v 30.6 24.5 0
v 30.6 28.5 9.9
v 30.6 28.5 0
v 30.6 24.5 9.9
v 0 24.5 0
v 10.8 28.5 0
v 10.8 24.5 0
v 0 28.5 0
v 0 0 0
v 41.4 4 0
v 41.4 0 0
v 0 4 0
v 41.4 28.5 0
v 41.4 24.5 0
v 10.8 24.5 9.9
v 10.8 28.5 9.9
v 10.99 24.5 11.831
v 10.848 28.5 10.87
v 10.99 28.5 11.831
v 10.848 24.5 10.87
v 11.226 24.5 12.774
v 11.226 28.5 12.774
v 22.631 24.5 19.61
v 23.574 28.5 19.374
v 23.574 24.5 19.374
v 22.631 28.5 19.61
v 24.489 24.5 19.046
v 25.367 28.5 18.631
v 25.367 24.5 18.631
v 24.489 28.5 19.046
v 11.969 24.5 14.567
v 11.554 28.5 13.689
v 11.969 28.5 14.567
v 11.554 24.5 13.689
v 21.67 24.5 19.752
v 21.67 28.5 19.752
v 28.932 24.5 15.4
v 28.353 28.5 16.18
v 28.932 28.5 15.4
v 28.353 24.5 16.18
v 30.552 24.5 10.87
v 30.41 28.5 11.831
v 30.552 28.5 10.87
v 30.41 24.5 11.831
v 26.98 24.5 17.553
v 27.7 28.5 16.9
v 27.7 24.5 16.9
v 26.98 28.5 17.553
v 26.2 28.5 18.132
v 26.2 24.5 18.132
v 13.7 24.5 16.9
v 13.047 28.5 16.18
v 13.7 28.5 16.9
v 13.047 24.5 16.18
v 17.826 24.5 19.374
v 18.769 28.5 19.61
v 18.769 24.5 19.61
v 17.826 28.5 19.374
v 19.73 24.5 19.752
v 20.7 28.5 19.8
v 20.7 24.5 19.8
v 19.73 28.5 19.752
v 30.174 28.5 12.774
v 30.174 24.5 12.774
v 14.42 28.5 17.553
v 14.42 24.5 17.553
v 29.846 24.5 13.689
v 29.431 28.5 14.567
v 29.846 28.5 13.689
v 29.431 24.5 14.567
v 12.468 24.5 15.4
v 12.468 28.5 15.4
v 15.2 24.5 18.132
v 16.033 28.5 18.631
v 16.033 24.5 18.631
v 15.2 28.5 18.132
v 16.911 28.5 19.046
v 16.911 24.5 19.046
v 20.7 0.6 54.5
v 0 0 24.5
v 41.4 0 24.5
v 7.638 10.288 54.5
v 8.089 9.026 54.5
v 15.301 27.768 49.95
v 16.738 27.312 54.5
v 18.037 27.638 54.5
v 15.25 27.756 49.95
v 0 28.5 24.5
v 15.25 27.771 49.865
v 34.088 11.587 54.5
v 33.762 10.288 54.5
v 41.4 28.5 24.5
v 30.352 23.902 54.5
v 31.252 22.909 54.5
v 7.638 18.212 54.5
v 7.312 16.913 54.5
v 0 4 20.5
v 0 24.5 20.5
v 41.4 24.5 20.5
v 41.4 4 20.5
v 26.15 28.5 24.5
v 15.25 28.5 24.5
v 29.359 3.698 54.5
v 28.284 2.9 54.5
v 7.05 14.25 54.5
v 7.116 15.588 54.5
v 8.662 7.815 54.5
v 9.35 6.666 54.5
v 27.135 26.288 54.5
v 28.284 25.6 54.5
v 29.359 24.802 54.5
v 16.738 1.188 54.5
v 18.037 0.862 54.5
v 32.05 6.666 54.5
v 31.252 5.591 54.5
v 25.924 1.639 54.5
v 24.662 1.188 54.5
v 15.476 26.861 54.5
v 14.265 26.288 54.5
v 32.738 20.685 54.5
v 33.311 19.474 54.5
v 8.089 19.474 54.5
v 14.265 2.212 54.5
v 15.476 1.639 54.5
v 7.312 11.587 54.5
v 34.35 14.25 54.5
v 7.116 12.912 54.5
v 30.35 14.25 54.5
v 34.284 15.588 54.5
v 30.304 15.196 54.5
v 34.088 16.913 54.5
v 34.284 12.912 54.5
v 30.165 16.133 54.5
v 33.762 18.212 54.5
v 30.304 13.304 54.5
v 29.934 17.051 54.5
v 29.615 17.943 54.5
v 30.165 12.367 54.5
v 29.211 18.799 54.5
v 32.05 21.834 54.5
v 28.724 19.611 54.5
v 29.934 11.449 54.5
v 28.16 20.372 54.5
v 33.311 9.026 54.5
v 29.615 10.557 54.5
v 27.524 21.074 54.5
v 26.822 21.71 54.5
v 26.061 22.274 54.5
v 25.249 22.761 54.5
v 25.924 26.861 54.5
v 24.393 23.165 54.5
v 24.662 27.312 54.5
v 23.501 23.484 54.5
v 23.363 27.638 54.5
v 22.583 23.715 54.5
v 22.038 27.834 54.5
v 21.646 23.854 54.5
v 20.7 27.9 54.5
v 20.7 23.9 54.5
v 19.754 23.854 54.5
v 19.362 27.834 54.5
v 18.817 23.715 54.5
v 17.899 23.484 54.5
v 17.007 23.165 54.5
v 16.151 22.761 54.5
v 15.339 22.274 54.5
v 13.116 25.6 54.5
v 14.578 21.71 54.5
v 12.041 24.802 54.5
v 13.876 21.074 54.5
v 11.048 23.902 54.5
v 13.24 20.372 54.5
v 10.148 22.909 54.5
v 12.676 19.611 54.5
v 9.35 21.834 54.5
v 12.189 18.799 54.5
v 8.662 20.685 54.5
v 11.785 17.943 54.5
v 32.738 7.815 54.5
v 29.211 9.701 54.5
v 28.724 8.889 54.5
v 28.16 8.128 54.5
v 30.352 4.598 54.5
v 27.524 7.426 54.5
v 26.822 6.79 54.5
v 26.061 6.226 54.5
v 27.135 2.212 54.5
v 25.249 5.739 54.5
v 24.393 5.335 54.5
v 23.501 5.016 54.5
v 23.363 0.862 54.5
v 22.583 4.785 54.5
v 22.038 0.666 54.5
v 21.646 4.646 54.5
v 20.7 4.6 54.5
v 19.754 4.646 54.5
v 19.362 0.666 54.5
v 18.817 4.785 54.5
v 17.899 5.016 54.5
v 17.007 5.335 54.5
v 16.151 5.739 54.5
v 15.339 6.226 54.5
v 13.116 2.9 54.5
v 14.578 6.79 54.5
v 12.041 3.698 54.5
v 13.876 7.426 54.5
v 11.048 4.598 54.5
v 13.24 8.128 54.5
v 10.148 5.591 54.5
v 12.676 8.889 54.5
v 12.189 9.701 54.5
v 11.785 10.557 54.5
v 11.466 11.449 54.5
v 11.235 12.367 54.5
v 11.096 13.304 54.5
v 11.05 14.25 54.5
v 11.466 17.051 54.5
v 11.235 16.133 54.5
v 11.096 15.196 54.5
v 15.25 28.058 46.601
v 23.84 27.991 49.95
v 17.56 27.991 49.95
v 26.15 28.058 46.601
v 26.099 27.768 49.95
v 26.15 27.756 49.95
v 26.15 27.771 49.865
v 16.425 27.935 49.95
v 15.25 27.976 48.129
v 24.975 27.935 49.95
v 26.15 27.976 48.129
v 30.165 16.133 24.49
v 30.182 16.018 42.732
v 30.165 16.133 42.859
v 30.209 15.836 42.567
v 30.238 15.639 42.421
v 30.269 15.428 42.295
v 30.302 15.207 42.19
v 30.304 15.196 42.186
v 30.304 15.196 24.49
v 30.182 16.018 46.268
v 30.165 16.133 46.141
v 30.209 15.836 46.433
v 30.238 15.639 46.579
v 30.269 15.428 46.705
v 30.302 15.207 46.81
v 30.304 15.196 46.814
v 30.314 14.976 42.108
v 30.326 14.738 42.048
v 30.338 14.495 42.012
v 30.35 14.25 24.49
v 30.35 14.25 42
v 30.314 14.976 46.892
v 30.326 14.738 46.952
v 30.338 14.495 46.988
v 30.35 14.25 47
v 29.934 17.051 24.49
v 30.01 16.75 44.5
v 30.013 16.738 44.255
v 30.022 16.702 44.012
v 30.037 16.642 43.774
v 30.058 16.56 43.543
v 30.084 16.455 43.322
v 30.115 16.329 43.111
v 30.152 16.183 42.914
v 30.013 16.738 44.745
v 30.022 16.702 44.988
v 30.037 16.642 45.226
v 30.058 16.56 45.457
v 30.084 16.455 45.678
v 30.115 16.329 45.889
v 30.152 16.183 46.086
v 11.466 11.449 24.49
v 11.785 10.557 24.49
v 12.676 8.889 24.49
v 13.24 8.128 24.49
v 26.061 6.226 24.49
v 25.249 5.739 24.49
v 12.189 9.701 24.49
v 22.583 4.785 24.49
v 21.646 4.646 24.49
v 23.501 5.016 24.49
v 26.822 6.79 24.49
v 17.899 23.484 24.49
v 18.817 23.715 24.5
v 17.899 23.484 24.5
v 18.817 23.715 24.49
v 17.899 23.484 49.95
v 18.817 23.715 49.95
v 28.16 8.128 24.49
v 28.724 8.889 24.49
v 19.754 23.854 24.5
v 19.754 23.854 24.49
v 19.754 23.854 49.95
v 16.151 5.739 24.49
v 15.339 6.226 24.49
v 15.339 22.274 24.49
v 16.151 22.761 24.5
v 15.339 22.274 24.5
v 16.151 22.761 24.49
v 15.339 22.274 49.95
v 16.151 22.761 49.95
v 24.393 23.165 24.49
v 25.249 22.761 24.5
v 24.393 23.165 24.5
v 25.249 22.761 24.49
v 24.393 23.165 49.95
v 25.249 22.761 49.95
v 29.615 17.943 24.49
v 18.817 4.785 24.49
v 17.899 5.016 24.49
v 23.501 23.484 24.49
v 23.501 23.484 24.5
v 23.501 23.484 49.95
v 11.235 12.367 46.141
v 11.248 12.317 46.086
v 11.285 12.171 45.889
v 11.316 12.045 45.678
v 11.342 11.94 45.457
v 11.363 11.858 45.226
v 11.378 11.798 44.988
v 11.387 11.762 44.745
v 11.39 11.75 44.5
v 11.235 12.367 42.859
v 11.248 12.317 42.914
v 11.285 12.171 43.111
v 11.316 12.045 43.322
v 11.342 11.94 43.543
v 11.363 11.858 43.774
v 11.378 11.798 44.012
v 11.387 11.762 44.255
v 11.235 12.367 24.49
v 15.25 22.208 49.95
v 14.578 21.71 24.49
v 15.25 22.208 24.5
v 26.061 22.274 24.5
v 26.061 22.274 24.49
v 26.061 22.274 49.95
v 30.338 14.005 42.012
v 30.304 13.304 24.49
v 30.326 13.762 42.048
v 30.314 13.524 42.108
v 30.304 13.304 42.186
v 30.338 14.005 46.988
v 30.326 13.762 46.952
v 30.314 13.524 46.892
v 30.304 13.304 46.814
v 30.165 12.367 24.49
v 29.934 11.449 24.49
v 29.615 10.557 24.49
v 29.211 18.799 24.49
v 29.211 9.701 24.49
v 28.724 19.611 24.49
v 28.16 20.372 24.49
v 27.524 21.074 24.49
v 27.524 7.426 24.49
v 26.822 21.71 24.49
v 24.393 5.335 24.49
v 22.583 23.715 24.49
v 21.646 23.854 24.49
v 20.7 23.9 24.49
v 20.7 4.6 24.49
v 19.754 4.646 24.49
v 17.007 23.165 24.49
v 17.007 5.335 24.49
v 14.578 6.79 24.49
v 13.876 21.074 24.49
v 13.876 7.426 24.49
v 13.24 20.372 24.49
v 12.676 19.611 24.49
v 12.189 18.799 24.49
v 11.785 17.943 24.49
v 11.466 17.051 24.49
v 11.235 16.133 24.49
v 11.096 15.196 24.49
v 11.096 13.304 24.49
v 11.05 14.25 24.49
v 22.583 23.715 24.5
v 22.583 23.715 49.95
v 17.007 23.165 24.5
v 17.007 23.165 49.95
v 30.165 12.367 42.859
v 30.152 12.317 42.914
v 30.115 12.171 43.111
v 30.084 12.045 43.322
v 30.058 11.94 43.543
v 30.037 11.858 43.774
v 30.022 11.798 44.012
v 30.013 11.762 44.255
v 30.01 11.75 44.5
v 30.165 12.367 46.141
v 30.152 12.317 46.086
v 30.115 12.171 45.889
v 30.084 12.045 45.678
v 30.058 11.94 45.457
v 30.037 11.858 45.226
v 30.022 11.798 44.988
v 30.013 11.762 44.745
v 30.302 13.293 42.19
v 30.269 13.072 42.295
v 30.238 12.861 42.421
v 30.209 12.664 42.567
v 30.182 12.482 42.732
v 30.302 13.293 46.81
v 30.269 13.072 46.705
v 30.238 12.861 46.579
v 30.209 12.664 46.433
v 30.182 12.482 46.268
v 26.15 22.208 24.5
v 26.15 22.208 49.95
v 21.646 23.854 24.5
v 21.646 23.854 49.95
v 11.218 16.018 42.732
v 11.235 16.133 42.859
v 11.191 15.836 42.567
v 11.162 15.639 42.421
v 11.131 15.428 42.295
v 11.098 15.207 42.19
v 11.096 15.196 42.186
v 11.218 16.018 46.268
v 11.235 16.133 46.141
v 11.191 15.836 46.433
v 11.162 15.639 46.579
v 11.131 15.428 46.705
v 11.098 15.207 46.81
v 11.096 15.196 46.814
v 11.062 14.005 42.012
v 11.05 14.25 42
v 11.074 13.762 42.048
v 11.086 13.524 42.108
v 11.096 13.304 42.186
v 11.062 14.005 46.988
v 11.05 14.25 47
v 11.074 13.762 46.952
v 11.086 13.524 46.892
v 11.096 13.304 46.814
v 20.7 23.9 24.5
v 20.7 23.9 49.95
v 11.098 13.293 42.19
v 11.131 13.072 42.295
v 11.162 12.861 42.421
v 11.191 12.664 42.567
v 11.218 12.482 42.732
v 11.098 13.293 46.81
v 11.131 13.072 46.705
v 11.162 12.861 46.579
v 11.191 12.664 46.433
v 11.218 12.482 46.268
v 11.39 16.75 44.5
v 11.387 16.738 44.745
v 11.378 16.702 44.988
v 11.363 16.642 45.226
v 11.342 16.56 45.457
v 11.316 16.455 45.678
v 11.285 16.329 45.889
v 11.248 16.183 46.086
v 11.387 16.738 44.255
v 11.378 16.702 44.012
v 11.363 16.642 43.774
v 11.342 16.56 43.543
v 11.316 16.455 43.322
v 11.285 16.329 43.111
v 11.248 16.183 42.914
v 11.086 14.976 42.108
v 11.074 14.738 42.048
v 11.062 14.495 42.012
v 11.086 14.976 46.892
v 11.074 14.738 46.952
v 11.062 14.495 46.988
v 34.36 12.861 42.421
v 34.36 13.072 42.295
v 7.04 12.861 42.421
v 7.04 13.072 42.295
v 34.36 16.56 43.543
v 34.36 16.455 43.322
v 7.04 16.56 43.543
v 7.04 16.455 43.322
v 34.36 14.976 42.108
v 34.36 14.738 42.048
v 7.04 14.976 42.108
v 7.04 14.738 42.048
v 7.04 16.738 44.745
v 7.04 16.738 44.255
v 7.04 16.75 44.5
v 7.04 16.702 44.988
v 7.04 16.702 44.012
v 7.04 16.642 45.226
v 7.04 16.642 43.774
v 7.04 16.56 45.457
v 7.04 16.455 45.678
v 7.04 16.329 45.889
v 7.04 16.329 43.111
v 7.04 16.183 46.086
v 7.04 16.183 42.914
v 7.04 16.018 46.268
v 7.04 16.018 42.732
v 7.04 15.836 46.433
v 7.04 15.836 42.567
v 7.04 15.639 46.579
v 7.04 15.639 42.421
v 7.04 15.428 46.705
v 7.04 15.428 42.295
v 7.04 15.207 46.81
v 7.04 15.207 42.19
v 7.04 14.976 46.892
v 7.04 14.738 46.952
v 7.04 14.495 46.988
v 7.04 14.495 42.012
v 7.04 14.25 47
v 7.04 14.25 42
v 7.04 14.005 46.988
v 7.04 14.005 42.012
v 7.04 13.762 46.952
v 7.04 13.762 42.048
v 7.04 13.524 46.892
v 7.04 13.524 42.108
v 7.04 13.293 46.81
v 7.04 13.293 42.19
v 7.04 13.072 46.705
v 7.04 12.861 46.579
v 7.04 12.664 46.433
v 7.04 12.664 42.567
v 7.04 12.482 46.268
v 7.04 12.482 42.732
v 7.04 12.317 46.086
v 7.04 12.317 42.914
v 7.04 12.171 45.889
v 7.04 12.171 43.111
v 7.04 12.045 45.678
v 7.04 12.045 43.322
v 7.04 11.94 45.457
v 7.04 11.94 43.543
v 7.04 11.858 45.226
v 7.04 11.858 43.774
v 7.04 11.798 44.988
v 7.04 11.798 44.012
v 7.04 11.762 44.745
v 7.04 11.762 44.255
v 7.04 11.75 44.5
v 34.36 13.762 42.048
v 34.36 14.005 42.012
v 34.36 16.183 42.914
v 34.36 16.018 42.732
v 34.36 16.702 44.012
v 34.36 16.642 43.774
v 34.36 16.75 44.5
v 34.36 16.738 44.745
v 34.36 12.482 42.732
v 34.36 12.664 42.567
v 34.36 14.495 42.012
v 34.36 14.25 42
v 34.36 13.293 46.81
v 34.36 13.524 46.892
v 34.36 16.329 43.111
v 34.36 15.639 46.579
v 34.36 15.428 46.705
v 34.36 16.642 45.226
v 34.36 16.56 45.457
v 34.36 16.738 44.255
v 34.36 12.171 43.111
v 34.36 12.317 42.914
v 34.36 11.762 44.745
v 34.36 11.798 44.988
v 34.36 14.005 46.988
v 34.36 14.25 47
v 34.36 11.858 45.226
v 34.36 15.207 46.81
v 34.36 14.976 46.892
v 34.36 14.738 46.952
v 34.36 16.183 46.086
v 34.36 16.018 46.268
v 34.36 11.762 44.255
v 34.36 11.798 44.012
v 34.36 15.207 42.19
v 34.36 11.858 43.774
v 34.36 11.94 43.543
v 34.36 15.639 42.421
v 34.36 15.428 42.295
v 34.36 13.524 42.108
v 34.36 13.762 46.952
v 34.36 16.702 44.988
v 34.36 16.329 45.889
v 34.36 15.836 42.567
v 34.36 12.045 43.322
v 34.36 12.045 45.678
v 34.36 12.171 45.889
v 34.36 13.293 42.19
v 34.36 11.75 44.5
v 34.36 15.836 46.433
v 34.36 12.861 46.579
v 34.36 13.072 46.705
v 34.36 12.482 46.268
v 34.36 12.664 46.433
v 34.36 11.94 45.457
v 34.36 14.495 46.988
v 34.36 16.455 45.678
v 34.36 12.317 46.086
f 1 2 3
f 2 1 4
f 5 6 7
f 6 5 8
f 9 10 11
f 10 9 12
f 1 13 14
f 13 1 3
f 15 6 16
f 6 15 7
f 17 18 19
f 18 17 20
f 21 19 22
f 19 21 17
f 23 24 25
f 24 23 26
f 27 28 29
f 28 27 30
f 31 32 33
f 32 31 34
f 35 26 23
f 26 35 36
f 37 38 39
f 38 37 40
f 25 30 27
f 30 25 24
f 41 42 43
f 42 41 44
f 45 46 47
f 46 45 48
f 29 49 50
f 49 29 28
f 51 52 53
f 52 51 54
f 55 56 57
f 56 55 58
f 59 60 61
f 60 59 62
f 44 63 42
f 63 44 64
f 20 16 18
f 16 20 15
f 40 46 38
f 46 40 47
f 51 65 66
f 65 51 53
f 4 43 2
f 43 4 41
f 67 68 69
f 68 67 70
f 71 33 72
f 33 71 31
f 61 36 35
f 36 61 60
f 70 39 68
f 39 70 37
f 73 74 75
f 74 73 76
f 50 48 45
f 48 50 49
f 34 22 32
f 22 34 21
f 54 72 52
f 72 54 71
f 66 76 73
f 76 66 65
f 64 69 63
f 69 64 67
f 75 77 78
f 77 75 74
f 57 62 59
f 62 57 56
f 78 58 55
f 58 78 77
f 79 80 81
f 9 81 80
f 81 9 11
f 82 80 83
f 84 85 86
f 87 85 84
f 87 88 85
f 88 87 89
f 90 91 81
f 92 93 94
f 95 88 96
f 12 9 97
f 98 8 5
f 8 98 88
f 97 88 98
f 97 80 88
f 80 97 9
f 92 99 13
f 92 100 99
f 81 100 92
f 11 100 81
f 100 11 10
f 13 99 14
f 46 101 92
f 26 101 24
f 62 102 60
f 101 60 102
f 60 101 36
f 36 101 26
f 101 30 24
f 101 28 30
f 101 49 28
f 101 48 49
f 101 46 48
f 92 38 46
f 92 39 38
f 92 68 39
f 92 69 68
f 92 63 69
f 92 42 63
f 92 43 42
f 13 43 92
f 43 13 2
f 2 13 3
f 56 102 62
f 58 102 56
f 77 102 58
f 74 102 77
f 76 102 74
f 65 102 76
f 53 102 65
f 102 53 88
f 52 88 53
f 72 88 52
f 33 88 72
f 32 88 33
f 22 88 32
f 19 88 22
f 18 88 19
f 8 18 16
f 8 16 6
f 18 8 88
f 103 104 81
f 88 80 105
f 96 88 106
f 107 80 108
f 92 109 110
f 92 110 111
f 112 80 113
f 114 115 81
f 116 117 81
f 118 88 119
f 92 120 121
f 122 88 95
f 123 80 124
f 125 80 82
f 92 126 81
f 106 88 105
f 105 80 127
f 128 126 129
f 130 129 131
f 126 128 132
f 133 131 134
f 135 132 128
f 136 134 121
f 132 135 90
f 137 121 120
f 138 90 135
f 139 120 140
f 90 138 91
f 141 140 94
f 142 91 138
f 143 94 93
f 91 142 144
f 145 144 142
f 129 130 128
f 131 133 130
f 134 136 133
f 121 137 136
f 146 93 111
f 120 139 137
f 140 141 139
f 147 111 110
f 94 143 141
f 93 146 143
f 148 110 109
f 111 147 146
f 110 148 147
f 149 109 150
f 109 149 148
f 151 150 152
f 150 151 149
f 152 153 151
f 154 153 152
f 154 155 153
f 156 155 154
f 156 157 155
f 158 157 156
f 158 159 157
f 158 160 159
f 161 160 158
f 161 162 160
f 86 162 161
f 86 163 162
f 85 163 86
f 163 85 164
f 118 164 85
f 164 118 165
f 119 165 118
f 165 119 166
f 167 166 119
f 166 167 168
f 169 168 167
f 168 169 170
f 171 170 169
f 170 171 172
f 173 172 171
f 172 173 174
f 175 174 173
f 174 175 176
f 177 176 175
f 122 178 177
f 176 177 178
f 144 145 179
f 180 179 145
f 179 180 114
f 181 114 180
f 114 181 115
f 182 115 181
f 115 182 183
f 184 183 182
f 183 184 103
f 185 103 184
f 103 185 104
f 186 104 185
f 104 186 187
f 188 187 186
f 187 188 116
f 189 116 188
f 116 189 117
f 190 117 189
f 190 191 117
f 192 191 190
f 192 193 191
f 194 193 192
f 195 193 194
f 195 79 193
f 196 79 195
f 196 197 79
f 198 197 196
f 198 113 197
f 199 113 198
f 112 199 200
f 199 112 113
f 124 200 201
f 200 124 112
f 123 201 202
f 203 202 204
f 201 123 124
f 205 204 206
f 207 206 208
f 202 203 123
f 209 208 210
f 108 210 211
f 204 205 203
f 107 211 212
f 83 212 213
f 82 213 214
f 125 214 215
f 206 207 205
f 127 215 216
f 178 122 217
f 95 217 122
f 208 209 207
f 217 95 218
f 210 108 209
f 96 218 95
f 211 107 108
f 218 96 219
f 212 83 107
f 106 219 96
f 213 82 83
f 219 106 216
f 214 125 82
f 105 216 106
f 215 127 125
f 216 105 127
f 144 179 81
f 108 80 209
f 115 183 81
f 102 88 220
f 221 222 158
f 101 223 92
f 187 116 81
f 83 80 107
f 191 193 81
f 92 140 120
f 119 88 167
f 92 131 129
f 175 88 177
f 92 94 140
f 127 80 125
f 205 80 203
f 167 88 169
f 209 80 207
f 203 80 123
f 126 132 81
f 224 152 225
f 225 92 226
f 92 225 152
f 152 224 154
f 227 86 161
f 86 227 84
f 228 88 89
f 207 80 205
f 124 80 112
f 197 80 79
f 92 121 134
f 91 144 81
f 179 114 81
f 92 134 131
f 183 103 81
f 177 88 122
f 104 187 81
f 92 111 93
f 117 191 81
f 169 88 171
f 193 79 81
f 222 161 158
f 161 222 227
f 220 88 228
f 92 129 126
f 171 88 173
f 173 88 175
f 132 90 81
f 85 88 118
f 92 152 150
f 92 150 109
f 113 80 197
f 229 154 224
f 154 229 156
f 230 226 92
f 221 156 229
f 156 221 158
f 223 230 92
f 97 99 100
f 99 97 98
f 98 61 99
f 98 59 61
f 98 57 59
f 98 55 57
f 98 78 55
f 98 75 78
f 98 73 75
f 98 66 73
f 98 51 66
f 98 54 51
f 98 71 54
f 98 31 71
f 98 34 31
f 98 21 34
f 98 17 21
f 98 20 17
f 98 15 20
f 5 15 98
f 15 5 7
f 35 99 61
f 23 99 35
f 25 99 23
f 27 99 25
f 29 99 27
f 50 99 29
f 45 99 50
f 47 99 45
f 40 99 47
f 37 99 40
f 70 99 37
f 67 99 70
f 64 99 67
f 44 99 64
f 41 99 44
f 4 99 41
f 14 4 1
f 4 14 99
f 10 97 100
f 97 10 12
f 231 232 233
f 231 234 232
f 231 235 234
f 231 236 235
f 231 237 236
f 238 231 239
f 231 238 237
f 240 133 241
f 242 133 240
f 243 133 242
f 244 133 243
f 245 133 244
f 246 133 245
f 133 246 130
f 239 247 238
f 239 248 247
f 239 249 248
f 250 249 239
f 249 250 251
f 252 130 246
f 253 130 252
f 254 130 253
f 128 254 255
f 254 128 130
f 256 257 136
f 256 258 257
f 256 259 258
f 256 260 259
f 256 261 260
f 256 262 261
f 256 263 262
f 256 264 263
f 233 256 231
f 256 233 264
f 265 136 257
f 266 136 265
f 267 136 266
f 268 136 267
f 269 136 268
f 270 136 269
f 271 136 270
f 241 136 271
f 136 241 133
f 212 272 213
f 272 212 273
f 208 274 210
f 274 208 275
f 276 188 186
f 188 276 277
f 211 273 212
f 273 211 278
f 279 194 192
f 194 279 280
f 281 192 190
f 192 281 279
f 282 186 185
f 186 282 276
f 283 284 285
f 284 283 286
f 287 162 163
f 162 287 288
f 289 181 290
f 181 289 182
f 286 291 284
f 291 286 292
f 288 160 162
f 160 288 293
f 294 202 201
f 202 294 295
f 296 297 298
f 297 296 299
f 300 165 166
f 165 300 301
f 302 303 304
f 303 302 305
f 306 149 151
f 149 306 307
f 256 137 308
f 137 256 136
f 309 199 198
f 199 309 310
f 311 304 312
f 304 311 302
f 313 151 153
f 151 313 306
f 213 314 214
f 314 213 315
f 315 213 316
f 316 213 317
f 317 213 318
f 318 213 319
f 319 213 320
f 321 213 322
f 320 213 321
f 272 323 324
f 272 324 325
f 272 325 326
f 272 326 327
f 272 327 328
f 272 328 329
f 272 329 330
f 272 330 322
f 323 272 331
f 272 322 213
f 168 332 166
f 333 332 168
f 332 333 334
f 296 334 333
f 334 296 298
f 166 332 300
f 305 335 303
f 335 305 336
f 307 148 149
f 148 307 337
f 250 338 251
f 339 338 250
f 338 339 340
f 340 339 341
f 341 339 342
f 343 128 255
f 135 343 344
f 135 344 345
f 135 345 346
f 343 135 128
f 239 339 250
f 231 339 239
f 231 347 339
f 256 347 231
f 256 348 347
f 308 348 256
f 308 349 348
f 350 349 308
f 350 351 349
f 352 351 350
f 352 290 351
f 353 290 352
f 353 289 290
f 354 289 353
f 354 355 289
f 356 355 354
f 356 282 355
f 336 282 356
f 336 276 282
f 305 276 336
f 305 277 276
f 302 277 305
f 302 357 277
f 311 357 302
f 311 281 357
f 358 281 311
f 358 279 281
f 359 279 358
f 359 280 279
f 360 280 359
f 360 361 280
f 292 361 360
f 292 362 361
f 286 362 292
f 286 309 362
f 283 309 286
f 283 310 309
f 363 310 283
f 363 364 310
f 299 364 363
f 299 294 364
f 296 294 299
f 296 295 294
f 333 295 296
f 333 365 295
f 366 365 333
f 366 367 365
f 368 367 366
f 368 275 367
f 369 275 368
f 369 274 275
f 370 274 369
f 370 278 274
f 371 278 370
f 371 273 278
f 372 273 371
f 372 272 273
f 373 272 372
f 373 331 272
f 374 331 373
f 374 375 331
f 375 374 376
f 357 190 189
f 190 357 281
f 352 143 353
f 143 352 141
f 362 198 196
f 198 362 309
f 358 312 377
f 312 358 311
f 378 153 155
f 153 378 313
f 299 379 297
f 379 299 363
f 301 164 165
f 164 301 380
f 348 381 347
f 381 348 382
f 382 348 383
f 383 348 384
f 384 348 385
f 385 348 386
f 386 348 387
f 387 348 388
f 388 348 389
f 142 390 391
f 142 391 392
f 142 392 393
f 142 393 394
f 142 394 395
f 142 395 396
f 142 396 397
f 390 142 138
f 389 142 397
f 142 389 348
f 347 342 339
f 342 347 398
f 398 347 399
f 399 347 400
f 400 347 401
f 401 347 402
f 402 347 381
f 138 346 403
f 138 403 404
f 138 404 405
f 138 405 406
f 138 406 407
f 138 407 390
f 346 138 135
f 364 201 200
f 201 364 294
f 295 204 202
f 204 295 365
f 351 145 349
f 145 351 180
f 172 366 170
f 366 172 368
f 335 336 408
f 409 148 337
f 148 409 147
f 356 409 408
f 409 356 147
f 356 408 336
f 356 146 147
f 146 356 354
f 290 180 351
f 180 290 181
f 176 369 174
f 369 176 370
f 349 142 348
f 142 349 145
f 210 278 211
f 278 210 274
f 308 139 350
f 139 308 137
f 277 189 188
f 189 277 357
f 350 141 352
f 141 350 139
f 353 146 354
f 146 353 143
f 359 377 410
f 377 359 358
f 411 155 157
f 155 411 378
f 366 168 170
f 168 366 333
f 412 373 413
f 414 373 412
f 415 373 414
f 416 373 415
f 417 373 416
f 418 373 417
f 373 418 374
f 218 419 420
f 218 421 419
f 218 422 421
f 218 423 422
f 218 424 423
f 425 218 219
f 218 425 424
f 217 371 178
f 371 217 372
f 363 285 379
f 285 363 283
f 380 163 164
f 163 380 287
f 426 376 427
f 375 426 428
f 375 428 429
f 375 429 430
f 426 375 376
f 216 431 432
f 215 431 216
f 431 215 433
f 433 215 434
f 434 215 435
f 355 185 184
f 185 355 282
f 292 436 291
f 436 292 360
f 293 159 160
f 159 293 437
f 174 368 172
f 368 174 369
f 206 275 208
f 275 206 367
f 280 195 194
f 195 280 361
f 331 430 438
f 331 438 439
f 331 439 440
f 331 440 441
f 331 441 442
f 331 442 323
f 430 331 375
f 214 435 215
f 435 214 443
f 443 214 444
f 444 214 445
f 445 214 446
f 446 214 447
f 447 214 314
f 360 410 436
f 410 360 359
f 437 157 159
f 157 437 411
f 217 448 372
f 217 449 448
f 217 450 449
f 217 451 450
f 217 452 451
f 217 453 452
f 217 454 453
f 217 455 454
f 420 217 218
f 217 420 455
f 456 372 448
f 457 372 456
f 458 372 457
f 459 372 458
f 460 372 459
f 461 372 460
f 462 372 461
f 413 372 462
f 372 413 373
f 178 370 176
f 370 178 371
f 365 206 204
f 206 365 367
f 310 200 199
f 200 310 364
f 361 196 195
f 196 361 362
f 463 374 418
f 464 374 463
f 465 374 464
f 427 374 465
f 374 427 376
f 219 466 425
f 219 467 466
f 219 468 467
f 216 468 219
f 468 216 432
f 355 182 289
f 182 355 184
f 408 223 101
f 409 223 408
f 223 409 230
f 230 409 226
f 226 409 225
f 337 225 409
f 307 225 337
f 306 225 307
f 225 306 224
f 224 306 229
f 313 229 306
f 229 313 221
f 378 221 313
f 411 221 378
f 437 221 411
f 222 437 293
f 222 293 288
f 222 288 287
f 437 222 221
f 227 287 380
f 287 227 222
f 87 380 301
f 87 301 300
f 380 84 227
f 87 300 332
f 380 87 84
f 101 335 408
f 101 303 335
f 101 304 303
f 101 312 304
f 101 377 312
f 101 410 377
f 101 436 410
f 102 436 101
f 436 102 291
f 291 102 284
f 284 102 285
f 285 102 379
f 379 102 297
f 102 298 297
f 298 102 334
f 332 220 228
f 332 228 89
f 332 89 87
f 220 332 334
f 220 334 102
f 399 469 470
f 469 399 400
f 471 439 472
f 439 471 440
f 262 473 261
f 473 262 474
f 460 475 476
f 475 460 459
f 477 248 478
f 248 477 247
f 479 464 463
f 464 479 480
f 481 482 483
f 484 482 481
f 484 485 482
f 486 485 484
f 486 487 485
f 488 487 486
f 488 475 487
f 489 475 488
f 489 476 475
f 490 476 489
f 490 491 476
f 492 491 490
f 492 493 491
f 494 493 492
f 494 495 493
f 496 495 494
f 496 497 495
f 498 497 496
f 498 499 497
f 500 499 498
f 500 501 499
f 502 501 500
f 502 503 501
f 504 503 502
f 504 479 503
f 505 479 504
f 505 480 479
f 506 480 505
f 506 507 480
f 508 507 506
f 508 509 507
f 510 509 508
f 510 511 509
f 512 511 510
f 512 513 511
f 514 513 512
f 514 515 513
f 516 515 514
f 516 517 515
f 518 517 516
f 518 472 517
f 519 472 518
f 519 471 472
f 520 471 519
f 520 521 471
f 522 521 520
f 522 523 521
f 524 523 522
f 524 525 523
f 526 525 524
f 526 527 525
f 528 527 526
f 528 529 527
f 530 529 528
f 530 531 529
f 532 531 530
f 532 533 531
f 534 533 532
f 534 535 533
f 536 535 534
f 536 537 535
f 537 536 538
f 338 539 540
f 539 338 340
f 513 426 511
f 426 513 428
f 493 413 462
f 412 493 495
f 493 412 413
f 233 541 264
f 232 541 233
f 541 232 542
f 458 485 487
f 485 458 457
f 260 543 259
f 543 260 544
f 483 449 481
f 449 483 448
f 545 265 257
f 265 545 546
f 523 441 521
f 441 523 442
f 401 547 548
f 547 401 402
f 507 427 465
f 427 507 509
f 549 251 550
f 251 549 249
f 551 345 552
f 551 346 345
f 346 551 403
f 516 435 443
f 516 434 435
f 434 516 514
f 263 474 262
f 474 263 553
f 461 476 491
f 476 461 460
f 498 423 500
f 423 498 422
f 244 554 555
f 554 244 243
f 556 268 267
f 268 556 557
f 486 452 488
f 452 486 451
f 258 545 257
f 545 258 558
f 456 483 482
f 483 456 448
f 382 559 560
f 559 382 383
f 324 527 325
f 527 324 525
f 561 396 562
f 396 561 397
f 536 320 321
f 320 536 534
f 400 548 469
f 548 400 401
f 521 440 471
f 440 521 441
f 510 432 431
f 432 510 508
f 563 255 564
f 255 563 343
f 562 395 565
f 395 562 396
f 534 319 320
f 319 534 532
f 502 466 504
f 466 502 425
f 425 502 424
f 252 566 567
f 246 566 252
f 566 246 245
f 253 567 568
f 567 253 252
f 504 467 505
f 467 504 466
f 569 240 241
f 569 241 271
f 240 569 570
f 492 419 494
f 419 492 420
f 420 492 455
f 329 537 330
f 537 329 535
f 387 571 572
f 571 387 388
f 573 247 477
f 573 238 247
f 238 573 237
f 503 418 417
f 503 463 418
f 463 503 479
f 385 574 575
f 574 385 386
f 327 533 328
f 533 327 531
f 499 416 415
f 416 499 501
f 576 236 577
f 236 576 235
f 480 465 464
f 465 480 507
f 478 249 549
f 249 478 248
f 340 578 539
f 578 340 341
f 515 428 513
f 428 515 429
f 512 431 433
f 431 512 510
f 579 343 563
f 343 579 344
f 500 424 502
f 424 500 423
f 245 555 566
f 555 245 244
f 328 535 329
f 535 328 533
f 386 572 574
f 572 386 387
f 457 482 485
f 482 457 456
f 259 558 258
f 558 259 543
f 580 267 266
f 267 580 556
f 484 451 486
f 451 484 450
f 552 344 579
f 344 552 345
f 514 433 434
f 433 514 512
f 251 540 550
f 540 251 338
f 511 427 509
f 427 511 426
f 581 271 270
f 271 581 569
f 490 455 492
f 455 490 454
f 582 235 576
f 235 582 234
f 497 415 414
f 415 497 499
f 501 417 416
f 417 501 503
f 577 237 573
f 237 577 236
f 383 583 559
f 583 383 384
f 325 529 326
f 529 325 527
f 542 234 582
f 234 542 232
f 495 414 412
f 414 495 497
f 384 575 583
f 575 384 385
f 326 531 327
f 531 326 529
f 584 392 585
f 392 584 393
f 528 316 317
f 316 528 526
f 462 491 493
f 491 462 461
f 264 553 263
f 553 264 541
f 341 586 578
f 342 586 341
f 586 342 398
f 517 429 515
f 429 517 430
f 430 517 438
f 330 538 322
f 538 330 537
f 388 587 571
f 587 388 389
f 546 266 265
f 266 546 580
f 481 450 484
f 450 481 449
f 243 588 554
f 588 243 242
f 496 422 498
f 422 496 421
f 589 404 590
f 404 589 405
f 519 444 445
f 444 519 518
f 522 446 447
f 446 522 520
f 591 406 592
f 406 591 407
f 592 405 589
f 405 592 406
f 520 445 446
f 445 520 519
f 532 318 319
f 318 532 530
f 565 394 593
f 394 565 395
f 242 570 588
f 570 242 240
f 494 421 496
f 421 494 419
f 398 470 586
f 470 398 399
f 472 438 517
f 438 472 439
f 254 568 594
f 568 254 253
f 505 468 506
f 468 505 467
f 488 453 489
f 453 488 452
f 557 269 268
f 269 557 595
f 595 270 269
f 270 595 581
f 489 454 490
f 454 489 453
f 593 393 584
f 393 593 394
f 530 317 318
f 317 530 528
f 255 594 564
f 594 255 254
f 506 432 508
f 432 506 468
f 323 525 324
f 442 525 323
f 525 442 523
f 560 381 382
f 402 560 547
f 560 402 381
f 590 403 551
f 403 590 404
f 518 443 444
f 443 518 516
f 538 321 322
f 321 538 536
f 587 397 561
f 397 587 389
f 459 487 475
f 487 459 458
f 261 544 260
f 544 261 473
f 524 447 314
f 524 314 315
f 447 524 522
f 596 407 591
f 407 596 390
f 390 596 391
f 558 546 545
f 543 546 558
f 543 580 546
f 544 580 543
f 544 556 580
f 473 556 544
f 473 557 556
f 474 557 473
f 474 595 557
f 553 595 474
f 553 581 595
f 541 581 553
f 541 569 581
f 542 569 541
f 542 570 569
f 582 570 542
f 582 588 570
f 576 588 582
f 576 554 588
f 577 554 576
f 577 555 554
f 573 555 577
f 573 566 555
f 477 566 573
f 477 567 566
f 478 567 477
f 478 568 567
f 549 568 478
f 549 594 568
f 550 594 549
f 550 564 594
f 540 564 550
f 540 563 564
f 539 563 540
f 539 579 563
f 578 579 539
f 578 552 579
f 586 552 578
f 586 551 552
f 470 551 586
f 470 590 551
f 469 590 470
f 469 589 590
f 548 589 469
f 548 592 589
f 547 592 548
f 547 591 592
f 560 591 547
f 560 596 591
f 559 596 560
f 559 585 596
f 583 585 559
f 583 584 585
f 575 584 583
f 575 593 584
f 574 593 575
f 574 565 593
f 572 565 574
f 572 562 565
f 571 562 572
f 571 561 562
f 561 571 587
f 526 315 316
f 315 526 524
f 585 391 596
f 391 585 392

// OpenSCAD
// file: ../lib/common.scad
// ─── common.scad ─────────────────────────────────────────────────────────────
// Shared utility modules for the 3D model project.
// Include with:  include <../lib/common.scad>
// ─────────────────────────────────────────────────────────────────────────────

$fn = 64; // global circle/sphere smoothness

// ── Rounded box ──────────────────────────────────────────────────────────────
// w/d/h = outer dimensions, r = corner radius
module rounded_box(w, d, h, r = 2) {
    hull() {
        for (x = [r, w - r])
        for (y = [r, d - r])
            translate([x, y, 0])
                cylinder(r = r, h = h);
    }
}

// ── Rounded box with optional hollow interior ─────────────────────────────────
// wall = wall thickness; set to 0 for a solid block
module box_shell(w, d, h, r = 2, wall = 1.5) {
    if (wall <= 0) {
        rounded_box(w, d, h, r);
    } else {
        difference() {
            rounded_box(w, d, h, r);
            translate([wall, wall, wall])
                rounded_box(w - wall*2, d - wall*2, h, max(r - wall, 0.1));
        }
    }
}

// ── Countersunk hole (for M-series screws) ────────────────────────────────────
// d_shaft = shaft diameter, d_head = countersink diameter, depth = head depth
module countersink(d_shaft, d_head, depth, h_total) {
    union() {
        cylinder(d = d_shaft, h = h_total);
        cylinder(d1 = d_head, d2 = d_shaft, h = depth);
    }
}

// ── Slot (oblong hole) ────────────────────────────────────────────────────────
// len = total length along X, w = width, h = depth
module slot(len, w, h) {
    r = w / 2;
    hull() {
        translate([r, 0, 0]) cylinder(r = r, h = h);
        translate([len - r, 0, 0]) cylinder(r = r, h = h);
    }
}

// ── Snap-fit clip (cantilever, +X direction) ─────────────────────────────────
// arm_l/w/h = arm dimensions, tip_h = tip protrusion
module snap_clip(arm_l = 10, arm_w = 4, arm_h = 1.5, tip_h = 1) {
    cube([arm_l, arm_w, arm_h]);
    translate([arm_l - tip_h, 0, arm_h])
        cube([tip_h, arm_w, tip_h]);
}

// ── Text label (recessed) ─────────────────────────────────────────────────────
// Use inside a difference(). t = text string, s = font size, depth = recess
module label(t, s = 5, depth = 0.5) {
    linear_extrude(depth)
        text(t, size = s, halign = "center", valign = "center");
}
// main file
// ─── tube_support_clamp.scad ──────────────────────────────────────────────────
// Saddle bracket that presses DOWN onto a square bar (lying flat, running in X).
// Round tube socket rises from the top centre.
// Coordinate convention matches the bar:
//   X = along bar length (bracket straddles this)
//   Y = bar depth  (20.7 mm)
//   Z = bar height (20.7 mm) — bracket presses down over this
//
// Print orientation: upside-down (socket pointing at build plate).
// ─────────────────────────────────────────────────────────────────────────────

include <../lib/common.scad>

// ── Parameters ────────────────────────────────────────────────────────────────

WALL = 4;                    // wall thickness (mm)

// Square bar cross-section  — -0.2 mm interference on each bore dimension
BAR_Y          = 20.7;       // bar depth  (Y)
BAR_Z          = 20.7;       // bar height (Z)
BORE_Y         = BAR_Y - 0.2;
BORE_Z         = BAR_Z - 0.2;

// Saddle grip length along X — how much bar length the bracket wraps
GRIP_X         = BAR_Y * 2;  // 2× bar width gives solid press-fit grip

// Round vertical tube — -0.2 mm interference press fit
TUBE_OD        = 19.5;
TUBE_BORE      = TUBE_OD - 0.2;
SOCKET_DEPTH   = 30;         // insertion depth of round tube

// Squared nut (inside round socket, locks tube)
NUT_W          = 10.3;
NUT_THICK      = 5;
NUT_FROM_FLOOR = 20;         // distance from socket floor to nut centre
NUT_SLOT_W     = NUT_W + 0.6;
NUT_SLOT_T     = NUT_THICK + 0.4;

// Wing screw shaft clearance
SCREW_D        = 5;

// ── Derived ───────────────────────────────────────────────────────────────────

// Outer saddle dimensions
SADDLE_X  = GRIP_X;
SADDLE_Y  = BORE_Y + WALL * 2;   // walls on ±Y faces
// Z: side walls reach down to bar bottom, roof sits on top of bar
SADDLE_Z  = BORE_Z + WALL;       // WALL roof + bar height (open at bottom)

SOCKET_OD = TUBE_BORE + WALL * 2;

// Socket centre sits at middle of saddle in X and Y
CX = SADDLE_X / 2;
CY = SADDLE_Y / 2;

// ── Body — hull from rectangular saddle top face to socket cylinder ────────────
module body() {
    hull() {
        // saddle block
        cube([SADDLE_X, SADDLE_Y, SADDLE_Z]);
        // socket cylinder rises from top centre
        translate([CX, CY, SADDLE_Z])
            cylinder(d = SOCKET_OD, h = SOCKET_DEPTH);
    }
}

// ── Bar channel — U-slot open at bottom AND both X ends (bar passes through) ───
module bar_channel() {
    // no X walls — bar runs straight through the full saddle width
    // Y walls (WALL thick each side) grip the bar depth
    // Z: open at bottom, closed by WALL roof at top
    translate([-0.01, WALL, -0.01])
        cube([SADDLE_X + 0.02, BORE_Y, BORE_Z + 0.01]);
}

// ── Front tube opening — slot on +Y face only, open at bottom ─────────────────
// Round-bottom slot centred in X, goes from Z=0 up through the bar channel.
// Depth = WALL so it only removes the front wall, not the full body.
module front_tube_opening() {
    tube_r = (TUBE_OD + 0.3) / 2;
    translate([CX, SADDLE_Y - WALL - 0.01, 0]) {
        // rectangular part from bottom up to tube centre
        translate([-tube_r, 0, 0])
            cube([tube_r * 2, WALL + 0.02, tube_r]);
        // semicircle top — rounds off the slot top
        translate([0, 0, tube_r])
            rotate([270, 0, 0])
                cylinder(r = tube_r, h = WALL + 0.02);
    }
}

// ── Round tube socket bore ────────────────────────────────────────────────────
module round_bore() {
    translate([CX, CY, SADDLE_Z - 0.01])
        cylinder(d = TUBE_BORE, h = SOCKET_DEPTH + 0.02);
}

// ── Nut slot — faces +Y (front), from socket floor up to nut top ──────────────
module nut_slot() {
    translate([CX - NUT_SLOT_W / 2, CY - NUT_SLOT_T / 2, SADDLE_Z])
        cube([NUT_SLOT_W, SOCKET_OD, NUT_FROM_FLOOR + NUT_SLOT_W / 2]);
}

// ── Wing screw bore — only through socket cylinder walls at nut height ─────────
module screw_bore() {
    // limited to SOCKET_OD width so it doesn't exit through the taper
    translate([CX - SOCKET_OD / 2 - 0.01, CY, SADDLE_Z + NUT_FROM_FLOOR])
        rotate([0, 90, 0])
            cylinder(d = SCREW_D, h = SOCKET_OD + 0.02);
}

// ── Assembly ──────────────────────────────────────────────────────────────────
difference() {
    body();
    bar_channel();
    front_tube_opening();
    round_bore();
    nut_slot();
    screw_bore();
}
